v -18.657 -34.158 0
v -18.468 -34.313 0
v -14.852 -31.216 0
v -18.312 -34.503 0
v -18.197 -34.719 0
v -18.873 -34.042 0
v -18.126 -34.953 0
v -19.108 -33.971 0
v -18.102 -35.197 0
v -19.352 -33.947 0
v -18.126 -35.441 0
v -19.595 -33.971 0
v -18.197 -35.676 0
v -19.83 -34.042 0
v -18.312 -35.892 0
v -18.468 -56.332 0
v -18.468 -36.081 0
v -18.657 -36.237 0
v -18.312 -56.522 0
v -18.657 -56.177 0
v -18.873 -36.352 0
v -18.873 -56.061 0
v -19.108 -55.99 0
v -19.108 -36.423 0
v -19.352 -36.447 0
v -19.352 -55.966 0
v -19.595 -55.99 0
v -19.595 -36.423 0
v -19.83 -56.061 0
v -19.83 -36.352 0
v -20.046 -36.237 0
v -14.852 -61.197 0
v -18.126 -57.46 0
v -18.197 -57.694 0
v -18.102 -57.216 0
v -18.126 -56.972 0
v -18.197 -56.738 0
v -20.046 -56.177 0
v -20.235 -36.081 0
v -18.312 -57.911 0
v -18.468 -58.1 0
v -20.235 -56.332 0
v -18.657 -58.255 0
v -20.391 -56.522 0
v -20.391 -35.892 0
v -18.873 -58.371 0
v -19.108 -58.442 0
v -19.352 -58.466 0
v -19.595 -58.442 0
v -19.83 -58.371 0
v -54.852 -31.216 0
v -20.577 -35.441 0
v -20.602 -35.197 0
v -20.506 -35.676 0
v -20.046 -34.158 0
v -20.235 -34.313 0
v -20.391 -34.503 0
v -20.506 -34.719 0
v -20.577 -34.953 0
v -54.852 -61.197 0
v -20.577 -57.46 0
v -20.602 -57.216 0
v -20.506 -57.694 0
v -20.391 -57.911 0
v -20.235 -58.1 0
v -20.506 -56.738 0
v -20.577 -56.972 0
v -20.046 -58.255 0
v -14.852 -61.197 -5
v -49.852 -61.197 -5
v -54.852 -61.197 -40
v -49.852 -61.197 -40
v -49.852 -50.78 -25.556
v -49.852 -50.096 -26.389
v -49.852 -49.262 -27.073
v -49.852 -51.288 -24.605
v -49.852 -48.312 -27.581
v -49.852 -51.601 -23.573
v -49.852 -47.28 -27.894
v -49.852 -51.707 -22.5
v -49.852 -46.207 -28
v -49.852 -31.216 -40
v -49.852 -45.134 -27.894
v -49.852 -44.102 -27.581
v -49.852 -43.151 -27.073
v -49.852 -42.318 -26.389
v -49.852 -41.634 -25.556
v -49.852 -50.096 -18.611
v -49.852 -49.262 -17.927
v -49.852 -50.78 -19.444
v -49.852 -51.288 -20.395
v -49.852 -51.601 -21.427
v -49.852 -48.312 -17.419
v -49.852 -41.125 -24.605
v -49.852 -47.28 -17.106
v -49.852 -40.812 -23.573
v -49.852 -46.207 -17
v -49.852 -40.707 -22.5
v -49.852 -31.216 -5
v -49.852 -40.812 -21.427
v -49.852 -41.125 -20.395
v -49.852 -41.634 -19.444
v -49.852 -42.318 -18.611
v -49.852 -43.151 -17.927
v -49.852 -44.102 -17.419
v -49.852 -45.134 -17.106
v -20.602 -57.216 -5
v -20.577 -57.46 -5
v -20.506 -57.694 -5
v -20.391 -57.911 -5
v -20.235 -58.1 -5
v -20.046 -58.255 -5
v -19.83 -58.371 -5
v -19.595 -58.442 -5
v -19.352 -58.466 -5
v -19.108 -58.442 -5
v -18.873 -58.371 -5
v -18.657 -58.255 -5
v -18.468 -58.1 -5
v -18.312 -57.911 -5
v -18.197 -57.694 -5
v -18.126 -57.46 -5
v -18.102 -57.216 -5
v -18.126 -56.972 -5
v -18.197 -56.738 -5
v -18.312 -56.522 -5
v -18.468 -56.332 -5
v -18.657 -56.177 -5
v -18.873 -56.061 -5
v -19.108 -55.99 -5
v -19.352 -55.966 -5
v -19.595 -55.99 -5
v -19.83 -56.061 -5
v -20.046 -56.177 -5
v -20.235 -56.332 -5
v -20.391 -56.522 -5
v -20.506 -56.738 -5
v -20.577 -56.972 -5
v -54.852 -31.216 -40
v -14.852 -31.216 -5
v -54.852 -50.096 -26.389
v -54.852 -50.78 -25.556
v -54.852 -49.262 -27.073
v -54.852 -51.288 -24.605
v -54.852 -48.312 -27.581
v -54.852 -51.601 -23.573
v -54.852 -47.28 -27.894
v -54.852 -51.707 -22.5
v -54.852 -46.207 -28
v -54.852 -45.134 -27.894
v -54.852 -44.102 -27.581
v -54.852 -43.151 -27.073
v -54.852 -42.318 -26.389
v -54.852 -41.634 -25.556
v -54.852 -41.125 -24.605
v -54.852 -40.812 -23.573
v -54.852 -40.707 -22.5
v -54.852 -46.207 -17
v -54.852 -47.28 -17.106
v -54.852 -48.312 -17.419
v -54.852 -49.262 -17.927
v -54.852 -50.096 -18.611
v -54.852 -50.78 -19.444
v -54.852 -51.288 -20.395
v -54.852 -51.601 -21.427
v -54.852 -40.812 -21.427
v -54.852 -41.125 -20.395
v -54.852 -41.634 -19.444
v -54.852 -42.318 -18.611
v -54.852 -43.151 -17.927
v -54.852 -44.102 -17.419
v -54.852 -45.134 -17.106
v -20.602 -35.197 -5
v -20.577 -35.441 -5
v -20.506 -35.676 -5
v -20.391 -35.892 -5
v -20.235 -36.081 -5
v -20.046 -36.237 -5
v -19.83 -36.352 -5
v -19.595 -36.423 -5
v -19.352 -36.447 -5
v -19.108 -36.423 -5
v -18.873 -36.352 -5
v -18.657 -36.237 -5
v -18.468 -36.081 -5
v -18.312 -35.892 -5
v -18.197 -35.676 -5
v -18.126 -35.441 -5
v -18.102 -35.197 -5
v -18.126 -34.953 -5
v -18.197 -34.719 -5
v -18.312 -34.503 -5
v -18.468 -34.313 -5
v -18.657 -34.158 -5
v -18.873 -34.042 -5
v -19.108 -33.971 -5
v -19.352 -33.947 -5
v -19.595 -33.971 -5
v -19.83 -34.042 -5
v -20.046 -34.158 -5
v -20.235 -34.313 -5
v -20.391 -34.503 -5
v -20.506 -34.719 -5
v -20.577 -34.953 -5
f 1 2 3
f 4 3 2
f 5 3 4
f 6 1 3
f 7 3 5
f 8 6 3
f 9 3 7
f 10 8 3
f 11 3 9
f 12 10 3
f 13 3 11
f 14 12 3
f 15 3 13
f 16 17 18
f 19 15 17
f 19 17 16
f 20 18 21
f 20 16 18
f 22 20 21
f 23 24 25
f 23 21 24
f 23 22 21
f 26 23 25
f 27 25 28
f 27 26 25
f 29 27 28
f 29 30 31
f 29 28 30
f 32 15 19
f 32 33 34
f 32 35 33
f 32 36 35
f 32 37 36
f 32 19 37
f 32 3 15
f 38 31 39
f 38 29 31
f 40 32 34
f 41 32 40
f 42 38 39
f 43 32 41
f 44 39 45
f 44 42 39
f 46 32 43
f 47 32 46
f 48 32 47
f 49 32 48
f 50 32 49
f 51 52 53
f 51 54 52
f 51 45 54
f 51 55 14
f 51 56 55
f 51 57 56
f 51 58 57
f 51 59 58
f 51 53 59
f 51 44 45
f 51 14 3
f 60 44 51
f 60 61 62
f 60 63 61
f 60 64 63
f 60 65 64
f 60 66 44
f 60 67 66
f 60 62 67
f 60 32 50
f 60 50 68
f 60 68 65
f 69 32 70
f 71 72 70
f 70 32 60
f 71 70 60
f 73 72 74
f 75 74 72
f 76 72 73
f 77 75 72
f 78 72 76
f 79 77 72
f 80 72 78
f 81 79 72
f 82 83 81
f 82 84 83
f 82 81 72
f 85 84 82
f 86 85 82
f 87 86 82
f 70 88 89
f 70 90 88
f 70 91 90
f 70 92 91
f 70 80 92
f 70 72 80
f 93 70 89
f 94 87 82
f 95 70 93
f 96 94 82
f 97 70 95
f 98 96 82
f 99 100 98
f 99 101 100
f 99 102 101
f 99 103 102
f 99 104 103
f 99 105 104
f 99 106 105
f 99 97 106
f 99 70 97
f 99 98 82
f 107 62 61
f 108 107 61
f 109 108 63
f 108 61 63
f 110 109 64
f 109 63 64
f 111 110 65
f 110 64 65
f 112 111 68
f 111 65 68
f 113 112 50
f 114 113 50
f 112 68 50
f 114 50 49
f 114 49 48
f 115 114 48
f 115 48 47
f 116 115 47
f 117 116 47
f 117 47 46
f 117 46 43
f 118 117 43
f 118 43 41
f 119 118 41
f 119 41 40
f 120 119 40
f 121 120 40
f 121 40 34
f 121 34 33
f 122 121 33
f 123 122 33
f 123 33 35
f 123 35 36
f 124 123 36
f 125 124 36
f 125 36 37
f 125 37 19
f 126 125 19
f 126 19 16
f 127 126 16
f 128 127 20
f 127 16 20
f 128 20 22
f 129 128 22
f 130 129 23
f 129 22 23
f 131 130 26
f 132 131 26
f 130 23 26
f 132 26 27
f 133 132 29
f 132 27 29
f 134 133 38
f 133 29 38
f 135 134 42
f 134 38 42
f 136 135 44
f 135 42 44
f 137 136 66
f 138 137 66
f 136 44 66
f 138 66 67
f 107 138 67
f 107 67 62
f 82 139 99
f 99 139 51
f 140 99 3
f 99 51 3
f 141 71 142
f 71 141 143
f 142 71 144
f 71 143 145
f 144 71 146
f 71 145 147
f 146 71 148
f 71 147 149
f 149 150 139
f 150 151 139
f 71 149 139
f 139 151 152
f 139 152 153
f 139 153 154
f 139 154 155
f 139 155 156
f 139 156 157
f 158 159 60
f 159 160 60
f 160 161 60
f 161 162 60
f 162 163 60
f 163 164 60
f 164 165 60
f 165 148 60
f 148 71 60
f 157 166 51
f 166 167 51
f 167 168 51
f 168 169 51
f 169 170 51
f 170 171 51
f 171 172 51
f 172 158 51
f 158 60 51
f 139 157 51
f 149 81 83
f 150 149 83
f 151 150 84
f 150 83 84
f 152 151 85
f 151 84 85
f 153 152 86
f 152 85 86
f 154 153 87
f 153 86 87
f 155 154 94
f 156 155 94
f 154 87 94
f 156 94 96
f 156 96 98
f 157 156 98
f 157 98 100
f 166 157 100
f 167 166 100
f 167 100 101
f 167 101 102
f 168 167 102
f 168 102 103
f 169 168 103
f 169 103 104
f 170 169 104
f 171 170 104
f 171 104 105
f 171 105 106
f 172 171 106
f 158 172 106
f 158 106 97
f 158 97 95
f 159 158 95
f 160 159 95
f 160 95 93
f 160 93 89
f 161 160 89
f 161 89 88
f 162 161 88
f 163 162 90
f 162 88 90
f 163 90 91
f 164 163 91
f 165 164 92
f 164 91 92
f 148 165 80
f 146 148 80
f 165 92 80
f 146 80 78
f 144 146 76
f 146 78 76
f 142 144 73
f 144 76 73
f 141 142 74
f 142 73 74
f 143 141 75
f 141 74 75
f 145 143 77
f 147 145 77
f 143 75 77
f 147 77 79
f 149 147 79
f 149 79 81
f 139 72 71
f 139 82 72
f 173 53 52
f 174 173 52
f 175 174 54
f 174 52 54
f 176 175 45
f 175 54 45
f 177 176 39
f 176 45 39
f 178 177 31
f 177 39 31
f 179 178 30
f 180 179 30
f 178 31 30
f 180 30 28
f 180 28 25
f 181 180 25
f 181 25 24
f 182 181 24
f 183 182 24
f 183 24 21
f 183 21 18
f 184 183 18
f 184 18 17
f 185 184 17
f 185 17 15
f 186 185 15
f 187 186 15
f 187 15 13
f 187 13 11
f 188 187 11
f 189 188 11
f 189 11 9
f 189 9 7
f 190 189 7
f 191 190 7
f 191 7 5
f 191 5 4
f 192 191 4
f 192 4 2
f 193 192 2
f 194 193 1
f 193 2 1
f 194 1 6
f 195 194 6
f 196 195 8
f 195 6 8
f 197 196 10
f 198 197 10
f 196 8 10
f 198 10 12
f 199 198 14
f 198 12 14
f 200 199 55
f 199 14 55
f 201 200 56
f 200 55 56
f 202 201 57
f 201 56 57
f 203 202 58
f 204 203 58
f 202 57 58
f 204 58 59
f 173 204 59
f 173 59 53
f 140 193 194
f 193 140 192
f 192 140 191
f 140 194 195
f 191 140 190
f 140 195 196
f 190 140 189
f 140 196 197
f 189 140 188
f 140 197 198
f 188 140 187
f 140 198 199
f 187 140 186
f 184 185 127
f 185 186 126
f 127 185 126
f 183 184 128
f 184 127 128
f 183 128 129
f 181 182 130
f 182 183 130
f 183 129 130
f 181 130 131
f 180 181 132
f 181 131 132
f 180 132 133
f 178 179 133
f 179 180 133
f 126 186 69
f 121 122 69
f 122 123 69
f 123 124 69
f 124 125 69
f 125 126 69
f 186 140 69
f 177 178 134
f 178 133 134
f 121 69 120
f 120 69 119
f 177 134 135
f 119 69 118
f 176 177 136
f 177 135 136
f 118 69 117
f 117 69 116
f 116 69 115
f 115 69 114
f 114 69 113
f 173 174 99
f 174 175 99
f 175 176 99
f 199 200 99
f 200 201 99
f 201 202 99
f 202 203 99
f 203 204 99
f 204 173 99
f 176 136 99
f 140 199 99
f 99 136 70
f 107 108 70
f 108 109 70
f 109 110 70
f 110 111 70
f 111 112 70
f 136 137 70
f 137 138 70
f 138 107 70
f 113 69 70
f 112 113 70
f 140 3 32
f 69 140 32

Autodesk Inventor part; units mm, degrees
ref_plane "YZ Plane" through (0, 0, 0) normal (1, 0, 0) x (0, 1, 0)
ref_plane "XZ Plane" through (0, 0, 0) normal (0, 1, 0) x (-1, 0, 0)
ref_plane "Plano de trabajo1" through (0, -46.2161, 0) normal (0, 0, 1) x (-1, 0, 0)
sketch "Boceto1" plane through (0, -46.2161, 0) normal (0, 0, 1) x (-1, 0, 0)
  line L0 (14.8515, 14.9812) -> (54.8515, 14.9812)
  line L1 (14.8515, -15) -> (14.8515, 14.9812)
  line L2 (54.8515, -15) -> (14.8515, -15)
  line L3 (54.8515, 14.9812) -> (54.8515, -15)
  circle A0 centre (19.3515, 11) radius 1.25
  circle A1 centre (19.3515, -11.0188) radius 1.25
  point P0 (0, -46.2161)
extrude "Extrusión1" add sketch "Boceto1" against normal blind 5
sketch "Boceto2" plane through (0, -46.2161, -5) normal (0, 0, -1) x (-1, 0, 0)
  line L0 (54.8515, -14.9812) -> (54.8515, 15) projected
  line L1 (54.8515, 15) -> (14.8515, 15) projected
  line L2 (54.8515, -14.9812) -> (49.8515, -14.9812)
  line L3 (49.8515, -14.9812) -> (49.8515, 15)
  line L4 (49.8515, 15) -> (54.8515, 15)
  line L5 (54.8515, 15) -> (54.8515, -14.9812)
  point P0 (0, 46.2161)
  dimension "d2" = 5
extrude "Extrusión2" add sketch "Boceto2" along normal blind 35
sketch "Boceto3" plane through (-49.8515, -61.1974, -5) normal (1, 0, 0) x (0, 0, -1)
  line L0 (0, 0) -> (35, 0)
  line L1 (35, 0) -> (35, 29.9812)
  line L2 (35, 29.9812) -> (0, 29.9812)
  line L3 (0, 29.9812) -> (0, 0)
  line L4 (0, 0) -> (35, 0) projected
  line L5 (0, 29.9812) -> (35, 29.9812) projected
  circle A0 centre (17.5, 14.9906) radius 5.5
  point P0 (-5, 61.1974)
  dimension "d5" = 11
extrude "Extrusión3" cut sketch "Boceto3" against normal blind 35 contours A0
thread "Rosca1" size "M11x1.5" class "6H" standard "ANSI Metric M Profile" full length
properties part number "Soporte"
